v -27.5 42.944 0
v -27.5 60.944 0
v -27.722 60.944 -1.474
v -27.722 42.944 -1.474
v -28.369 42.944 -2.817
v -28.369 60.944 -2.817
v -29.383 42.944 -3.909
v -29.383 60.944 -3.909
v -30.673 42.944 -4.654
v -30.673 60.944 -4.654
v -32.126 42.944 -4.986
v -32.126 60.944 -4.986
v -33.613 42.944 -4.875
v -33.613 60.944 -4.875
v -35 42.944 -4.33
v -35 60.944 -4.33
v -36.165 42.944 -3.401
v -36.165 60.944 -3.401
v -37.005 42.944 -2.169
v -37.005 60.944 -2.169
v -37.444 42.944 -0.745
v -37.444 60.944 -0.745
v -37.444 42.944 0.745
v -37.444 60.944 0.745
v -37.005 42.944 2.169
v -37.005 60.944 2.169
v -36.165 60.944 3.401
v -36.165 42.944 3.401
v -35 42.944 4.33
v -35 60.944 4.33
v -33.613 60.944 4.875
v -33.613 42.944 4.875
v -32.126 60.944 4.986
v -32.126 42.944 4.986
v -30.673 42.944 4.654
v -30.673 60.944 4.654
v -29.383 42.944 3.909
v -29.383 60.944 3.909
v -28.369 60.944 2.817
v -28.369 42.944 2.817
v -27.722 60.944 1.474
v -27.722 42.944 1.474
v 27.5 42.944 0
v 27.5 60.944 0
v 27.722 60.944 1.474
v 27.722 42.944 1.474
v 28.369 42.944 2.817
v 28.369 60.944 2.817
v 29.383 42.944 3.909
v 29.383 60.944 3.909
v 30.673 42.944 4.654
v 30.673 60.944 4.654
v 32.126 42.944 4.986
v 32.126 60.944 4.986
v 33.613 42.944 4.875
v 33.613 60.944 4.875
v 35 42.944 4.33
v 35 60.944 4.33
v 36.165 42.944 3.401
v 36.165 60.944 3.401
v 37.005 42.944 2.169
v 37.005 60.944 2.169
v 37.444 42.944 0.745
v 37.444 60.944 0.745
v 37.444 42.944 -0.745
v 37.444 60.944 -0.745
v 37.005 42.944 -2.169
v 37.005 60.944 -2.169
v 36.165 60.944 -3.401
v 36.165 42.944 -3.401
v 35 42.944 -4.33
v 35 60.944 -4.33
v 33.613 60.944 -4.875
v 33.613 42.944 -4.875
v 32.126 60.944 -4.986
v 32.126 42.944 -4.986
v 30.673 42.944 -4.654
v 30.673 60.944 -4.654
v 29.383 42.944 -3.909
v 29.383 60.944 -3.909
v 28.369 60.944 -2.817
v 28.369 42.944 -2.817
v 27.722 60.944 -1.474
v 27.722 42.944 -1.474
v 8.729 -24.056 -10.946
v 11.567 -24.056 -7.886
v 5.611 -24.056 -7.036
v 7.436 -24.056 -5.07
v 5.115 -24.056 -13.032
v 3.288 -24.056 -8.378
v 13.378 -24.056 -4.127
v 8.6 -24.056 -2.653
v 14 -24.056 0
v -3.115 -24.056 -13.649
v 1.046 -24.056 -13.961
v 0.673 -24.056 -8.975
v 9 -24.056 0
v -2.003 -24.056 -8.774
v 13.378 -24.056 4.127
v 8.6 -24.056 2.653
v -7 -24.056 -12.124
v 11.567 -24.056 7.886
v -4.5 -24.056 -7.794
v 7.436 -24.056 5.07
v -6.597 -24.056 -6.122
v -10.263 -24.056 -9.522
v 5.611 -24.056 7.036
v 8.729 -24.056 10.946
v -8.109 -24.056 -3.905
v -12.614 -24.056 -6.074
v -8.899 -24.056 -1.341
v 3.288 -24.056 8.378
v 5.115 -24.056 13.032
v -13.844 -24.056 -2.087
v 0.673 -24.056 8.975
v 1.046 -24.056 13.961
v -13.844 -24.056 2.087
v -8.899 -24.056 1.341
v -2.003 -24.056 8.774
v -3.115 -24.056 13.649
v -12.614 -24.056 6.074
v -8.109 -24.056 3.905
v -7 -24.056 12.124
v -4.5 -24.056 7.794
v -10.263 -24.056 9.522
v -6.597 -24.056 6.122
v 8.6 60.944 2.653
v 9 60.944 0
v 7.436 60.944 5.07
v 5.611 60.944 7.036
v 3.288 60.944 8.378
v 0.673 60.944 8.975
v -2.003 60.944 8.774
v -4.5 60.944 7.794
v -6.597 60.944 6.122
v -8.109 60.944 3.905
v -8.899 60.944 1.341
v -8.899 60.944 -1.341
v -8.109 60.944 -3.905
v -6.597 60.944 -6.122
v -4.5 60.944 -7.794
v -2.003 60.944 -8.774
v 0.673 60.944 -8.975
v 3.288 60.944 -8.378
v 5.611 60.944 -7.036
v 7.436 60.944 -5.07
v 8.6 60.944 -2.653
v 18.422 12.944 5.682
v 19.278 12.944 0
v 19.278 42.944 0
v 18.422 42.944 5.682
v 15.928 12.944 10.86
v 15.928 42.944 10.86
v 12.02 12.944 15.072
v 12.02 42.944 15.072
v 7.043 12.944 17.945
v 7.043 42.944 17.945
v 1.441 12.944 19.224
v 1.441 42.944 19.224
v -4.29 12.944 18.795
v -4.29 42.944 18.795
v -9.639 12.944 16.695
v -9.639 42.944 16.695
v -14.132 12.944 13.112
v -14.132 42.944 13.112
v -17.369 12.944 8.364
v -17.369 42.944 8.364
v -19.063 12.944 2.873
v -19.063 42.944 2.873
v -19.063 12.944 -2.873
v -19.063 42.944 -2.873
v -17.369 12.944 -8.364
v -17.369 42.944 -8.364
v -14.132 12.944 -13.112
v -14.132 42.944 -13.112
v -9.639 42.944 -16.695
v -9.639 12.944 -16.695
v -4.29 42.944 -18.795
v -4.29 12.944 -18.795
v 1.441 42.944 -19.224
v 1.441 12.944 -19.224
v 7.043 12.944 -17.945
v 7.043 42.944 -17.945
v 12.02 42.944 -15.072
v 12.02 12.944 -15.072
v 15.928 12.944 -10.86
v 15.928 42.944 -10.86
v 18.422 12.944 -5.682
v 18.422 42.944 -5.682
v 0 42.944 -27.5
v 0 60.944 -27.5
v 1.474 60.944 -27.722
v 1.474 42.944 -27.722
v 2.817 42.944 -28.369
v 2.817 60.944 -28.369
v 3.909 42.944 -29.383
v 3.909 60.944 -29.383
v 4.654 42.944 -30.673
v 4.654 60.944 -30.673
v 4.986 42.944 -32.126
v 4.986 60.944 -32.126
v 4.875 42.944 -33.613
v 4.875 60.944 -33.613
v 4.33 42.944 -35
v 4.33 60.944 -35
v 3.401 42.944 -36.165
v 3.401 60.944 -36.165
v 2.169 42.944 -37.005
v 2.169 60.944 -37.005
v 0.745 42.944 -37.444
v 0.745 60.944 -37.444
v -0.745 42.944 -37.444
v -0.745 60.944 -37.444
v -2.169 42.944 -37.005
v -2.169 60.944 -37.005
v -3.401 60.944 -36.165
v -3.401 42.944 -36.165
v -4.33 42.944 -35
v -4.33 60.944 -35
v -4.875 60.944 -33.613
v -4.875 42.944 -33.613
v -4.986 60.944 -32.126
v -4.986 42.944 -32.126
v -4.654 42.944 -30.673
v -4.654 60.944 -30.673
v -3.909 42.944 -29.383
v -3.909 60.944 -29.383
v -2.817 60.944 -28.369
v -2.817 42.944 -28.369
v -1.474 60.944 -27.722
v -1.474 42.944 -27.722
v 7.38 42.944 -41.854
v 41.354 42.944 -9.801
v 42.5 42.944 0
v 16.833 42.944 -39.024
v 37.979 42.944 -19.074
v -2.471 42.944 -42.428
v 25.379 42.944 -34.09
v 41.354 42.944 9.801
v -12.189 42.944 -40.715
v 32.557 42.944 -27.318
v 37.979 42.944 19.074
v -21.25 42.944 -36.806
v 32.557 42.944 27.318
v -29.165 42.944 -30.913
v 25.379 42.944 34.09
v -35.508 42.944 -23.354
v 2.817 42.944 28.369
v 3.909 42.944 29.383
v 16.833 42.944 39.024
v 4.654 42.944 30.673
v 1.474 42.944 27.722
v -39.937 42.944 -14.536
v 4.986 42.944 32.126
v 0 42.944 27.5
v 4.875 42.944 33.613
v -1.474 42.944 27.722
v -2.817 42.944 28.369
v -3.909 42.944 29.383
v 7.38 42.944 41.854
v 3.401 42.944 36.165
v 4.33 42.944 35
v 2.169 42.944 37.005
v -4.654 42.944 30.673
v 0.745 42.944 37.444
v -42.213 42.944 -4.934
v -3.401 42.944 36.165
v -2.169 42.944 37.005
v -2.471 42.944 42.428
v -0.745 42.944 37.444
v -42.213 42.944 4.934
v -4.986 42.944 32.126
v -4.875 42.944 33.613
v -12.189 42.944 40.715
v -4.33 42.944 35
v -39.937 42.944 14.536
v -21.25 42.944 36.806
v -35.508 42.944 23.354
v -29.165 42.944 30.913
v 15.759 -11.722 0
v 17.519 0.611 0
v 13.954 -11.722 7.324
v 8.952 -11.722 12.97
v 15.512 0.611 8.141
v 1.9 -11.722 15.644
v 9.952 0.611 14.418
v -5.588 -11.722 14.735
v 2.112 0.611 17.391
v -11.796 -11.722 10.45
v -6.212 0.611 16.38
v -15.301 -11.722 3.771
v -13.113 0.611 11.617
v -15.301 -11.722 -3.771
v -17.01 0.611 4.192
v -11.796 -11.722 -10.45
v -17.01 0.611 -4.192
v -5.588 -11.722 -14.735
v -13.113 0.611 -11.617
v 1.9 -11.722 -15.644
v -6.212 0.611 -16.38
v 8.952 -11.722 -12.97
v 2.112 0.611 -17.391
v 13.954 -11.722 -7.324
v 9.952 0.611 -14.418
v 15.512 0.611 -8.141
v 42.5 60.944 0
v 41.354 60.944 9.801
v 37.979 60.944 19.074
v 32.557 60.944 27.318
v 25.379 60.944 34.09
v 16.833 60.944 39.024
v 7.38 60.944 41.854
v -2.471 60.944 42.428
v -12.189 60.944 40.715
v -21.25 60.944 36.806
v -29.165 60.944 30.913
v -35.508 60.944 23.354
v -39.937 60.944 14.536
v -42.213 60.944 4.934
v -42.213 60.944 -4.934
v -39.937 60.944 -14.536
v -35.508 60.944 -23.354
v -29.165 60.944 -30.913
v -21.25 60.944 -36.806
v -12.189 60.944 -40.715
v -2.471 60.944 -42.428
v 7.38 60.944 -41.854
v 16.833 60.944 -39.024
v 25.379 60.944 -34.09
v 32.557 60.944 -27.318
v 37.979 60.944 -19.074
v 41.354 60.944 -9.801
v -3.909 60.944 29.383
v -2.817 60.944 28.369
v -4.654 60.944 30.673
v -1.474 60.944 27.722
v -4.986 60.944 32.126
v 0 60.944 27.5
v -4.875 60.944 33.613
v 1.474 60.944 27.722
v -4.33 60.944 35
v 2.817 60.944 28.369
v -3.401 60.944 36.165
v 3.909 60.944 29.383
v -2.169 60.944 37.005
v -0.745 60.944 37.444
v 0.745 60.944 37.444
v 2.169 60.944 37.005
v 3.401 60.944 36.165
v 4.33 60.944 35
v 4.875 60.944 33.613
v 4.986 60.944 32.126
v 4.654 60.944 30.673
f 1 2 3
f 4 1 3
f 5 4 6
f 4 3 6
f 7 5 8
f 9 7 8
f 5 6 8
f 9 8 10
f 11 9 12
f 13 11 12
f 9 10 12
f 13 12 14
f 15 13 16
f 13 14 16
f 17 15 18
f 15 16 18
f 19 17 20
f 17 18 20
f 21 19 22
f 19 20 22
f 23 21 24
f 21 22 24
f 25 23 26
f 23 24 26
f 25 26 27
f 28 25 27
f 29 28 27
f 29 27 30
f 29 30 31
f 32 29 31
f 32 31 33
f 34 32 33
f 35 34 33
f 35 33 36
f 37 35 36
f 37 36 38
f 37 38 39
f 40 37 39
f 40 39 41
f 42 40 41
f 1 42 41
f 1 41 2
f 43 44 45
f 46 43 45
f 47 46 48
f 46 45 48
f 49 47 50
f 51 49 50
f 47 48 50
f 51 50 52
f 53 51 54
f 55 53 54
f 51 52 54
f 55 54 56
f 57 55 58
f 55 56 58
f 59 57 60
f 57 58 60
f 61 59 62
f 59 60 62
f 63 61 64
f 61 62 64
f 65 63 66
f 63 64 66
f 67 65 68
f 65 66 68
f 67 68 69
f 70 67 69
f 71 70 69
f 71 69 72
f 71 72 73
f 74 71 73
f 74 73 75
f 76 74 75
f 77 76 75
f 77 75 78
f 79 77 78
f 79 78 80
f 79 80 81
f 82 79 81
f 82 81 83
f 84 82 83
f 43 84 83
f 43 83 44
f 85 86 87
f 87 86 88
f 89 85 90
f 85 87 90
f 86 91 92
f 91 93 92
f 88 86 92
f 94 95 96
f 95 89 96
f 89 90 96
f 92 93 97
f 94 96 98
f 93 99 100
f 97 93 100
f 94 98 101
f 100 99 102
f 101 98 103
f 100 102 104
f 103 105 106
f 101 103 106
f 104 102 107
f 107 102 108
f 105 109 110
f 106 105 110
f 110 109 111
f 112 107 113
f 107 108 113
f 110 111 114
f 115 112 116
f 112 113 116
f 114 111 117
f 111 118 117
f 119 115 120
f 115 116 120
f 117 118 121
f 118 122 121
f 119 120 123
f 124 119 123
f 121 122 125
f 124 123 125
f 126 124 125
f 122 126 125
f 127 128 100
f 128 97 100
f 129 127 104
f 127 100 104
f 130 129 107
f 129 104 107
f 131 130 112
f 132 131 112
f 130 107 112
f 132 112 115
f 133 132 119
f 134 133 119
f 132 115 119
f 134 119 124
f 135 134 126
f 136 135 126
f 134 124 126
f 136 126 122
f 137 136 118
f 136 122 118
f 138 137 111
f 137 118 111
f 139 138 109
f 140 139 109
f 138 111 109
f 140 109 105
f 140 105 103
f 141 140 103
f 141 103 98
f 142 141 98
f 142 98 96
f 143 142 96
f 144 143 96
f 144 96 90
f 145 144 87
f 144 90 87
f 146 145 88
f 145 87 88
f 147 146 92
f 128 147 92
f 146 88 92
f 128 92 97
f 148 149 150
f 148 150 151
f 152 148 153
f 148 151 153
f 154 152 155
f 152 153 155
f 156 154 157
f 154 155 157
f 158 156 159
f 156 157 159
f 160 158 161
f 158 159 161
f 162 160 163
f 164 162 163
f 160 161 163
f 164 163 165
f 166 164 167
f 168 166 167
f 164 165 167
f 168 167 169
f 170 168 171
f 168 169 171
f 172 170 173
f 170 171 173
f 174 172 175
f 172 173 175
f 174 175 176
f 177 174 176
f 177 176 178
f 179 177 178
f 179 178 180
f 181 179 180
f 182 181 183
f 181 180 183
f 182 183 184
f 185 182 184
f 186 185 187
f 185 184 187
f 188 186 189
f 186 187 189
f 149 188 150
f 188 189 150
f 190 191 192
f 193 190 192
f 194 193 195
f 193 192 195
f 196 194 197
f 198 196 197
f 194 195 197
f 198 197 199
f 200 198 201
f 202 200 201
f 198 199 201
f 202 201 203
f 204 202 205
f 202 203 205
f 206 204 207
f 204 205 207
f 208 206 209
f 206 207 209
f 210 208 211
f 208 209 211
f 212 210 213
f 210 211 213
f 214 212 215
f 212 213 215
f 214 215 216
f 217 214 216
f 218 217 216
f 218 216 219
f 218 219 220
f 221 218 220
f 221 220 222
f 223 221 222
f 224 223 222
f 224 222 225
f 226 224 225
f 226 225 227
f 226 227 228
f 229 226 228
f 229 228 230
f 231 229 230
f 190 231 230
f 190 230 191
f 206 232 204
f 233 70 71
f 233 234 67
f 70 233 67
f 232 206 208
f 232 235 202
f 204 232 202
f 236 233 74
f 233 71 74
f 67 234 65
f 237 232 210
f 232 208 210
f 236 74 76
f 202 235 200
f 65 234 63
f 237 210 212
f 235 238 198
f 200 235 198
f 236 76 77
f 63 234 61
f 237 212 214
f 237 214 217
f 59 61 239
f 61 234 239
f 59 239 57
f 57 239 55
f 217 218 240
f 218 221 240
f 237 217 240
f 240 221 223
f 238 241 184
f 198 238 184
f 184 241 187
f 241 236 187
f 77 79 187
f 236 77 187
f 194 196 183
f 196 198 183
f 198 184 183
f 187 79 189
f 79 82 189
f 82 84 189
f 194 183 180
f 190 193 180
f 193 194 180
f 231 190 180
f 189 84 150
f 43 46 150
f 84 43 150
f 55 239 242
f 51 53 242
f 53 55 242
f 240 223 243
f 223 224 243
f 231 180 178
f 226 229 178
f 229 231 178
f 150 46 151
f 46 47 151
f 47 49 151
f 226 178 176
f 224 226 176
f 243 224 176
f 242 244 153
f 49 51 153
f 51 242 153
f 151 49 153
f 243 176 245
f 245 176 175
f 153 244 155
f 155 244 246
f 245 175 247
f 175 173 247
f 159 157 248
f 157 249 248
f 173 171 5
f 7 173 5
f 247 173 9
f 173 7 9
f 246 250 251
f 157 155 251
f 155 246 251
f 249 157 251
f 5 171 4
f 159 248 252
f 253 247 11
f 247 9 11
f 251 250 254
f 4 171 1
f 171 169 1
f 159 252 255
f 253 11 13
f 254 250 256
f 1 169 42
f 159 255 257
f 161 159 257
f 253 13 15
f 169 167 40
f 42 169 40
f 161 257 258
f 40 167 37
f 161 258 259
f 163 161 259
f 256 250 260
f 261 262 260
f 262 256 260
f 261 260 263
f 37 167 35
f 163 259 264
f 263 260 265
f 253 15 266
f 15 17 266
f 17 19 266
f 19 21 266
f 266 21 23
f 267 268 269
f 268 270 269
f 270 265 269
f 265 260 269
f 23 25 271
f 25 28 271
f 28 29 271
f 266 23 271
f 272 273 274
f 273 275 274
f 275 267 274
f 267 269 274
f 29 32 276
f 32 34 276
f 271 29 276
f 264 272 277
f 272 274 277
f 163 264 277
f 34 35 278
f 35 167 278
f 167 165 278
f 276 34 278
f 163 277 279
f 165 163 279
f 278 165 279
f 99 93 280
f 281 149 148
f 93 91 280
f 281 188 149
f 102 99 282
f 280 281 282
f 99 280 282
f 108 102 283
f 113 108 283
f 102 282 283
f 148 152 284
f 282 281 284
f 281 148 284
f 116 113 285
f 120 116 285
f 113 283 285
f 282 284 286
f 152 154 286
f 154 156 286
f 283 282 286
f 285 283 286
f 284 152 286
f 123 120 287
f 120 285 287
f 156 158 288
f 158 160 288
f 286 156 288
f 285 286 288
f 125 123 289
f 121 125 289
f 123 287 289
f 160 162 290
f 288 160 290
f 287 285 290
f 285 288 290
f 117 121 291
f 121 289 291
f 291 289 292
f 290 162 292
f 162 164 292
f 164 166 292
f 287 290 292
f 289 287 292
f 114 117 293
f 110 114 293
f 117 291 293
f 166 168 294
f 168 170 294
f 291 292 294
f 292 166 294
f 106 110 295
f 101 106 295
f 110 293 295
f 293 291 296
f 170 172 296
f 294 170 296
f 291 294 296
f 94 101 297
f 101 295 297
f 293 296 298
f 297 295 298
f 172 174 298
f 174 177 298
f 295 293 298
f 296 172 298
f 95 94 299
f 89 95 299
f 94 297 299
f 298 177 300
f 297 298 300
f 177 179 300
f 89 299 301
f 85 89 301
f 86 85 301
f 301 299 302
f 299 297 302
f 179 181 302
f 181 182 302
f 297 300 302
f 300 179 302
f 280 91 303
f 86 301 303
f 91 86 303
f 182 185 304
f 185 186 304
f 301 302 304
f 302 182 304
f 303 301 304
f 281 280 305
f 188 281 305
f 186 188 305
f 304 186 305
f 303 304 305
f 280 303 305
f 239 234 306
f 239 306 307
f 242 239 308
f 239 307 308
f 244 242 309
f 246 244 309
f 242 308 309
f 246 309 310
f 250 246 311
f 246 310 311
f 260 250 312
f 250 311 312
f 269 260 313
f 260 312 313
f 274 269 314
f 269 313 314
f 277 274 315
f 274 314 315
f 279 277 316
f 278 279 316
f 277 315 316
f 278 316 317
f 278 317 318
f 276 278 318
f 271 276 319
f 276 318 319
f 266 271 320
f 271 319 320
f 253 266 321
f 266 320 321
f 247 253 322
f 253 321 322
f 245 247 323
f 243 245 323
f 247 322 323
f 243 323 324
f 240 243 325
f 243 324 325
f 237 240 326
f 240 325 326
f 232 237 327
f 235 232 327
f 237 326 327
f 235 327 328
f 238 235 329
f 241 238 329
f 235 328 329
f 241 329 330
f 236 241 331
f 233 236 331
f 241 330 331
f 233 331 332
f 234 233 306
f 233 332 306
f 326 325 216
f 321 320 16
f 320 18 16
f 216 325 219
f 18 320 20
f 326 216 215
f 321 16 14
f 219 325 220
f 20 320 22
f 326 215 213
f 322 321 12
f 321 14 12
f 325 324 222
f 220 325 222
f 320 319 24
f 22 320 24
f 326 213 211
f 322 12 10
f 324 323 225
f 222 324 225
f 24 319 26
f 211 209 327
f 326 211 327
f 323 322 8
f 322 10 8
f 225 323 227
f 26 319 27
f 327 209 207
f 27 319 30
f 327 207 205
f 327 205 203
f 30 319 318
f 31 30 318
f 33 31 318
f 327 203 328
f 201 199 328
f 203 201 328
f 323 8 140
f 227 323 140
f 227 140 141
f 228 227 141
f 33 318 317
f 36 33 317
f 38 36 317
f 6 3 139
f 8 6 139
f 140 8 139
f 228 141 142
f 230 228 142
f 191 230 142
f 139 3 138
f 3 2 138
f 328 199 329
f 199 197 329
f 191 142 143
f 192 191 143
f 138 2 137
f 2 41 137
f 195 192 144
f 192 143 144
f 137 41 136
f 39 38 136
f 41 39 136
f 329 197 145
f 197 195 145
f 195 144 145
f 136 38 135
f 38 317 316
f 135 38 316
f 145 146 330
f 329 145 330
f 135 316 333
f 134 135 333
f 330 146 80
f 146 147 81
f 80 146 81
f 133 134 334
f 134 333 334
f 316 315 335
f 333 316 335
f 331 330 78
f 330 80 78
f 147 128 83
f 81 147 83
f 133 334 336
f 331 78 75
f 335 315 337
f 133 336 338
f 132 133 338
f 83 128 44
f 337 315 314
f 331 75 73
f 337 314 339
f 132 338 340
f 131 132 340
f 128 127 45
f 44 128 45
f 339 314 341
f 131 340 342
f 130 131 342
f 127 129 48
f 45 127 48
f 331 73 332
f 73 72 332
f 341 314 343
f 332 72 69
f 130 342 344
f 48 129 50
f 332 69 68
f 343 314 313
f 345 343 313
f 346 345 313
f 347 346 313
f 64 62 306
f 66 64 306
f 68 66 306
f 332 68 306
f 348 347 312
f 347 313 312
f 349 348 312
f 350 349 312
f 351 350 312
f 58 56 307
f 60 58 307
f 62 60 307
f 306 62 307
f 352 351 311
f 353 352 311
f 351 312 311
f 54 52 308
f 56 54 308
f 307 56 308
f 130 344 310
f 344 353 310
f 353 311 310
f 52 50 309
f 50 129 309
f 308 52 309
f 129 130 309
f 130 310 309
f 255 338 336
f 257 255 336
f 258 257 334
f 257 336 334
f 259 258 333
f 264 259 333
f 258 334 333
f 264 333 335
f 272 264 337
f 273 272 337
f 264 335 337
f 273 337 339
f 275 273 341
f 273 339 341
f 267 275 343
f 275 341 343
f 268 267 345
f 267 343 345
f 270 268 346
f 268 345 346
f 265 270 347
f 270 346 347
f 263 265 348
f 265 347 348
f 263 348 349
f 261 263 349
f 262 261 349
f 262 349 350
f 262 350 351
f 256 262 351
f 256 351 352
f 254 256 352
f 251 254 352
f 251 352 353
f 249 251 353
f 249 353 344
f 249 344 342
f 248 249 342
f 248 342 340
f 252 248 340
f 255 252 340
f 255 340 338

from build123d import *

# Parameters (mm, degrees)
F3_D            = 10
F3_COPIES_COUNT = 4


# Not quite as in the source:
# - a pattern or mirror of a feature is missing from the dataset's text; its kind, count and spacing are read off the source's solid


with BuildPart() as f1:
    # F0 (on Top) → F1 (revolve)
    with BuildSketch(Plane.XY):
        Polygon((42.5, 60.944458911), (9, 60.944458911), (9, -24.055541089), (14, -24.055541089), (19.277993122, 12.944458911), (19.277993122, 42.944458911), (42.5, 42.944458911), align=None)
    revolve(axis=Axis((0, 17.8779862242, 0), (0, -1, 0)))

    # F3 (through all)
    with Locations(Plane.XZ.offset(-42.944458911)):
        with Locations((32.5, 0)):
            f3 = Hole(F3_D / 2)

    # F3_copies: F3 ×4 about axis
    f3_copies_axis = Axis((0, 0, 0), (0, 1, 0))
    for i in range(1, F3_COPIES_COUNT):
        add(f3.rotate(f3_copies_axis, i * 360 / F3_COPIES_COUNT), mode=Mode.SUBTRACT)


solid = f1.part
